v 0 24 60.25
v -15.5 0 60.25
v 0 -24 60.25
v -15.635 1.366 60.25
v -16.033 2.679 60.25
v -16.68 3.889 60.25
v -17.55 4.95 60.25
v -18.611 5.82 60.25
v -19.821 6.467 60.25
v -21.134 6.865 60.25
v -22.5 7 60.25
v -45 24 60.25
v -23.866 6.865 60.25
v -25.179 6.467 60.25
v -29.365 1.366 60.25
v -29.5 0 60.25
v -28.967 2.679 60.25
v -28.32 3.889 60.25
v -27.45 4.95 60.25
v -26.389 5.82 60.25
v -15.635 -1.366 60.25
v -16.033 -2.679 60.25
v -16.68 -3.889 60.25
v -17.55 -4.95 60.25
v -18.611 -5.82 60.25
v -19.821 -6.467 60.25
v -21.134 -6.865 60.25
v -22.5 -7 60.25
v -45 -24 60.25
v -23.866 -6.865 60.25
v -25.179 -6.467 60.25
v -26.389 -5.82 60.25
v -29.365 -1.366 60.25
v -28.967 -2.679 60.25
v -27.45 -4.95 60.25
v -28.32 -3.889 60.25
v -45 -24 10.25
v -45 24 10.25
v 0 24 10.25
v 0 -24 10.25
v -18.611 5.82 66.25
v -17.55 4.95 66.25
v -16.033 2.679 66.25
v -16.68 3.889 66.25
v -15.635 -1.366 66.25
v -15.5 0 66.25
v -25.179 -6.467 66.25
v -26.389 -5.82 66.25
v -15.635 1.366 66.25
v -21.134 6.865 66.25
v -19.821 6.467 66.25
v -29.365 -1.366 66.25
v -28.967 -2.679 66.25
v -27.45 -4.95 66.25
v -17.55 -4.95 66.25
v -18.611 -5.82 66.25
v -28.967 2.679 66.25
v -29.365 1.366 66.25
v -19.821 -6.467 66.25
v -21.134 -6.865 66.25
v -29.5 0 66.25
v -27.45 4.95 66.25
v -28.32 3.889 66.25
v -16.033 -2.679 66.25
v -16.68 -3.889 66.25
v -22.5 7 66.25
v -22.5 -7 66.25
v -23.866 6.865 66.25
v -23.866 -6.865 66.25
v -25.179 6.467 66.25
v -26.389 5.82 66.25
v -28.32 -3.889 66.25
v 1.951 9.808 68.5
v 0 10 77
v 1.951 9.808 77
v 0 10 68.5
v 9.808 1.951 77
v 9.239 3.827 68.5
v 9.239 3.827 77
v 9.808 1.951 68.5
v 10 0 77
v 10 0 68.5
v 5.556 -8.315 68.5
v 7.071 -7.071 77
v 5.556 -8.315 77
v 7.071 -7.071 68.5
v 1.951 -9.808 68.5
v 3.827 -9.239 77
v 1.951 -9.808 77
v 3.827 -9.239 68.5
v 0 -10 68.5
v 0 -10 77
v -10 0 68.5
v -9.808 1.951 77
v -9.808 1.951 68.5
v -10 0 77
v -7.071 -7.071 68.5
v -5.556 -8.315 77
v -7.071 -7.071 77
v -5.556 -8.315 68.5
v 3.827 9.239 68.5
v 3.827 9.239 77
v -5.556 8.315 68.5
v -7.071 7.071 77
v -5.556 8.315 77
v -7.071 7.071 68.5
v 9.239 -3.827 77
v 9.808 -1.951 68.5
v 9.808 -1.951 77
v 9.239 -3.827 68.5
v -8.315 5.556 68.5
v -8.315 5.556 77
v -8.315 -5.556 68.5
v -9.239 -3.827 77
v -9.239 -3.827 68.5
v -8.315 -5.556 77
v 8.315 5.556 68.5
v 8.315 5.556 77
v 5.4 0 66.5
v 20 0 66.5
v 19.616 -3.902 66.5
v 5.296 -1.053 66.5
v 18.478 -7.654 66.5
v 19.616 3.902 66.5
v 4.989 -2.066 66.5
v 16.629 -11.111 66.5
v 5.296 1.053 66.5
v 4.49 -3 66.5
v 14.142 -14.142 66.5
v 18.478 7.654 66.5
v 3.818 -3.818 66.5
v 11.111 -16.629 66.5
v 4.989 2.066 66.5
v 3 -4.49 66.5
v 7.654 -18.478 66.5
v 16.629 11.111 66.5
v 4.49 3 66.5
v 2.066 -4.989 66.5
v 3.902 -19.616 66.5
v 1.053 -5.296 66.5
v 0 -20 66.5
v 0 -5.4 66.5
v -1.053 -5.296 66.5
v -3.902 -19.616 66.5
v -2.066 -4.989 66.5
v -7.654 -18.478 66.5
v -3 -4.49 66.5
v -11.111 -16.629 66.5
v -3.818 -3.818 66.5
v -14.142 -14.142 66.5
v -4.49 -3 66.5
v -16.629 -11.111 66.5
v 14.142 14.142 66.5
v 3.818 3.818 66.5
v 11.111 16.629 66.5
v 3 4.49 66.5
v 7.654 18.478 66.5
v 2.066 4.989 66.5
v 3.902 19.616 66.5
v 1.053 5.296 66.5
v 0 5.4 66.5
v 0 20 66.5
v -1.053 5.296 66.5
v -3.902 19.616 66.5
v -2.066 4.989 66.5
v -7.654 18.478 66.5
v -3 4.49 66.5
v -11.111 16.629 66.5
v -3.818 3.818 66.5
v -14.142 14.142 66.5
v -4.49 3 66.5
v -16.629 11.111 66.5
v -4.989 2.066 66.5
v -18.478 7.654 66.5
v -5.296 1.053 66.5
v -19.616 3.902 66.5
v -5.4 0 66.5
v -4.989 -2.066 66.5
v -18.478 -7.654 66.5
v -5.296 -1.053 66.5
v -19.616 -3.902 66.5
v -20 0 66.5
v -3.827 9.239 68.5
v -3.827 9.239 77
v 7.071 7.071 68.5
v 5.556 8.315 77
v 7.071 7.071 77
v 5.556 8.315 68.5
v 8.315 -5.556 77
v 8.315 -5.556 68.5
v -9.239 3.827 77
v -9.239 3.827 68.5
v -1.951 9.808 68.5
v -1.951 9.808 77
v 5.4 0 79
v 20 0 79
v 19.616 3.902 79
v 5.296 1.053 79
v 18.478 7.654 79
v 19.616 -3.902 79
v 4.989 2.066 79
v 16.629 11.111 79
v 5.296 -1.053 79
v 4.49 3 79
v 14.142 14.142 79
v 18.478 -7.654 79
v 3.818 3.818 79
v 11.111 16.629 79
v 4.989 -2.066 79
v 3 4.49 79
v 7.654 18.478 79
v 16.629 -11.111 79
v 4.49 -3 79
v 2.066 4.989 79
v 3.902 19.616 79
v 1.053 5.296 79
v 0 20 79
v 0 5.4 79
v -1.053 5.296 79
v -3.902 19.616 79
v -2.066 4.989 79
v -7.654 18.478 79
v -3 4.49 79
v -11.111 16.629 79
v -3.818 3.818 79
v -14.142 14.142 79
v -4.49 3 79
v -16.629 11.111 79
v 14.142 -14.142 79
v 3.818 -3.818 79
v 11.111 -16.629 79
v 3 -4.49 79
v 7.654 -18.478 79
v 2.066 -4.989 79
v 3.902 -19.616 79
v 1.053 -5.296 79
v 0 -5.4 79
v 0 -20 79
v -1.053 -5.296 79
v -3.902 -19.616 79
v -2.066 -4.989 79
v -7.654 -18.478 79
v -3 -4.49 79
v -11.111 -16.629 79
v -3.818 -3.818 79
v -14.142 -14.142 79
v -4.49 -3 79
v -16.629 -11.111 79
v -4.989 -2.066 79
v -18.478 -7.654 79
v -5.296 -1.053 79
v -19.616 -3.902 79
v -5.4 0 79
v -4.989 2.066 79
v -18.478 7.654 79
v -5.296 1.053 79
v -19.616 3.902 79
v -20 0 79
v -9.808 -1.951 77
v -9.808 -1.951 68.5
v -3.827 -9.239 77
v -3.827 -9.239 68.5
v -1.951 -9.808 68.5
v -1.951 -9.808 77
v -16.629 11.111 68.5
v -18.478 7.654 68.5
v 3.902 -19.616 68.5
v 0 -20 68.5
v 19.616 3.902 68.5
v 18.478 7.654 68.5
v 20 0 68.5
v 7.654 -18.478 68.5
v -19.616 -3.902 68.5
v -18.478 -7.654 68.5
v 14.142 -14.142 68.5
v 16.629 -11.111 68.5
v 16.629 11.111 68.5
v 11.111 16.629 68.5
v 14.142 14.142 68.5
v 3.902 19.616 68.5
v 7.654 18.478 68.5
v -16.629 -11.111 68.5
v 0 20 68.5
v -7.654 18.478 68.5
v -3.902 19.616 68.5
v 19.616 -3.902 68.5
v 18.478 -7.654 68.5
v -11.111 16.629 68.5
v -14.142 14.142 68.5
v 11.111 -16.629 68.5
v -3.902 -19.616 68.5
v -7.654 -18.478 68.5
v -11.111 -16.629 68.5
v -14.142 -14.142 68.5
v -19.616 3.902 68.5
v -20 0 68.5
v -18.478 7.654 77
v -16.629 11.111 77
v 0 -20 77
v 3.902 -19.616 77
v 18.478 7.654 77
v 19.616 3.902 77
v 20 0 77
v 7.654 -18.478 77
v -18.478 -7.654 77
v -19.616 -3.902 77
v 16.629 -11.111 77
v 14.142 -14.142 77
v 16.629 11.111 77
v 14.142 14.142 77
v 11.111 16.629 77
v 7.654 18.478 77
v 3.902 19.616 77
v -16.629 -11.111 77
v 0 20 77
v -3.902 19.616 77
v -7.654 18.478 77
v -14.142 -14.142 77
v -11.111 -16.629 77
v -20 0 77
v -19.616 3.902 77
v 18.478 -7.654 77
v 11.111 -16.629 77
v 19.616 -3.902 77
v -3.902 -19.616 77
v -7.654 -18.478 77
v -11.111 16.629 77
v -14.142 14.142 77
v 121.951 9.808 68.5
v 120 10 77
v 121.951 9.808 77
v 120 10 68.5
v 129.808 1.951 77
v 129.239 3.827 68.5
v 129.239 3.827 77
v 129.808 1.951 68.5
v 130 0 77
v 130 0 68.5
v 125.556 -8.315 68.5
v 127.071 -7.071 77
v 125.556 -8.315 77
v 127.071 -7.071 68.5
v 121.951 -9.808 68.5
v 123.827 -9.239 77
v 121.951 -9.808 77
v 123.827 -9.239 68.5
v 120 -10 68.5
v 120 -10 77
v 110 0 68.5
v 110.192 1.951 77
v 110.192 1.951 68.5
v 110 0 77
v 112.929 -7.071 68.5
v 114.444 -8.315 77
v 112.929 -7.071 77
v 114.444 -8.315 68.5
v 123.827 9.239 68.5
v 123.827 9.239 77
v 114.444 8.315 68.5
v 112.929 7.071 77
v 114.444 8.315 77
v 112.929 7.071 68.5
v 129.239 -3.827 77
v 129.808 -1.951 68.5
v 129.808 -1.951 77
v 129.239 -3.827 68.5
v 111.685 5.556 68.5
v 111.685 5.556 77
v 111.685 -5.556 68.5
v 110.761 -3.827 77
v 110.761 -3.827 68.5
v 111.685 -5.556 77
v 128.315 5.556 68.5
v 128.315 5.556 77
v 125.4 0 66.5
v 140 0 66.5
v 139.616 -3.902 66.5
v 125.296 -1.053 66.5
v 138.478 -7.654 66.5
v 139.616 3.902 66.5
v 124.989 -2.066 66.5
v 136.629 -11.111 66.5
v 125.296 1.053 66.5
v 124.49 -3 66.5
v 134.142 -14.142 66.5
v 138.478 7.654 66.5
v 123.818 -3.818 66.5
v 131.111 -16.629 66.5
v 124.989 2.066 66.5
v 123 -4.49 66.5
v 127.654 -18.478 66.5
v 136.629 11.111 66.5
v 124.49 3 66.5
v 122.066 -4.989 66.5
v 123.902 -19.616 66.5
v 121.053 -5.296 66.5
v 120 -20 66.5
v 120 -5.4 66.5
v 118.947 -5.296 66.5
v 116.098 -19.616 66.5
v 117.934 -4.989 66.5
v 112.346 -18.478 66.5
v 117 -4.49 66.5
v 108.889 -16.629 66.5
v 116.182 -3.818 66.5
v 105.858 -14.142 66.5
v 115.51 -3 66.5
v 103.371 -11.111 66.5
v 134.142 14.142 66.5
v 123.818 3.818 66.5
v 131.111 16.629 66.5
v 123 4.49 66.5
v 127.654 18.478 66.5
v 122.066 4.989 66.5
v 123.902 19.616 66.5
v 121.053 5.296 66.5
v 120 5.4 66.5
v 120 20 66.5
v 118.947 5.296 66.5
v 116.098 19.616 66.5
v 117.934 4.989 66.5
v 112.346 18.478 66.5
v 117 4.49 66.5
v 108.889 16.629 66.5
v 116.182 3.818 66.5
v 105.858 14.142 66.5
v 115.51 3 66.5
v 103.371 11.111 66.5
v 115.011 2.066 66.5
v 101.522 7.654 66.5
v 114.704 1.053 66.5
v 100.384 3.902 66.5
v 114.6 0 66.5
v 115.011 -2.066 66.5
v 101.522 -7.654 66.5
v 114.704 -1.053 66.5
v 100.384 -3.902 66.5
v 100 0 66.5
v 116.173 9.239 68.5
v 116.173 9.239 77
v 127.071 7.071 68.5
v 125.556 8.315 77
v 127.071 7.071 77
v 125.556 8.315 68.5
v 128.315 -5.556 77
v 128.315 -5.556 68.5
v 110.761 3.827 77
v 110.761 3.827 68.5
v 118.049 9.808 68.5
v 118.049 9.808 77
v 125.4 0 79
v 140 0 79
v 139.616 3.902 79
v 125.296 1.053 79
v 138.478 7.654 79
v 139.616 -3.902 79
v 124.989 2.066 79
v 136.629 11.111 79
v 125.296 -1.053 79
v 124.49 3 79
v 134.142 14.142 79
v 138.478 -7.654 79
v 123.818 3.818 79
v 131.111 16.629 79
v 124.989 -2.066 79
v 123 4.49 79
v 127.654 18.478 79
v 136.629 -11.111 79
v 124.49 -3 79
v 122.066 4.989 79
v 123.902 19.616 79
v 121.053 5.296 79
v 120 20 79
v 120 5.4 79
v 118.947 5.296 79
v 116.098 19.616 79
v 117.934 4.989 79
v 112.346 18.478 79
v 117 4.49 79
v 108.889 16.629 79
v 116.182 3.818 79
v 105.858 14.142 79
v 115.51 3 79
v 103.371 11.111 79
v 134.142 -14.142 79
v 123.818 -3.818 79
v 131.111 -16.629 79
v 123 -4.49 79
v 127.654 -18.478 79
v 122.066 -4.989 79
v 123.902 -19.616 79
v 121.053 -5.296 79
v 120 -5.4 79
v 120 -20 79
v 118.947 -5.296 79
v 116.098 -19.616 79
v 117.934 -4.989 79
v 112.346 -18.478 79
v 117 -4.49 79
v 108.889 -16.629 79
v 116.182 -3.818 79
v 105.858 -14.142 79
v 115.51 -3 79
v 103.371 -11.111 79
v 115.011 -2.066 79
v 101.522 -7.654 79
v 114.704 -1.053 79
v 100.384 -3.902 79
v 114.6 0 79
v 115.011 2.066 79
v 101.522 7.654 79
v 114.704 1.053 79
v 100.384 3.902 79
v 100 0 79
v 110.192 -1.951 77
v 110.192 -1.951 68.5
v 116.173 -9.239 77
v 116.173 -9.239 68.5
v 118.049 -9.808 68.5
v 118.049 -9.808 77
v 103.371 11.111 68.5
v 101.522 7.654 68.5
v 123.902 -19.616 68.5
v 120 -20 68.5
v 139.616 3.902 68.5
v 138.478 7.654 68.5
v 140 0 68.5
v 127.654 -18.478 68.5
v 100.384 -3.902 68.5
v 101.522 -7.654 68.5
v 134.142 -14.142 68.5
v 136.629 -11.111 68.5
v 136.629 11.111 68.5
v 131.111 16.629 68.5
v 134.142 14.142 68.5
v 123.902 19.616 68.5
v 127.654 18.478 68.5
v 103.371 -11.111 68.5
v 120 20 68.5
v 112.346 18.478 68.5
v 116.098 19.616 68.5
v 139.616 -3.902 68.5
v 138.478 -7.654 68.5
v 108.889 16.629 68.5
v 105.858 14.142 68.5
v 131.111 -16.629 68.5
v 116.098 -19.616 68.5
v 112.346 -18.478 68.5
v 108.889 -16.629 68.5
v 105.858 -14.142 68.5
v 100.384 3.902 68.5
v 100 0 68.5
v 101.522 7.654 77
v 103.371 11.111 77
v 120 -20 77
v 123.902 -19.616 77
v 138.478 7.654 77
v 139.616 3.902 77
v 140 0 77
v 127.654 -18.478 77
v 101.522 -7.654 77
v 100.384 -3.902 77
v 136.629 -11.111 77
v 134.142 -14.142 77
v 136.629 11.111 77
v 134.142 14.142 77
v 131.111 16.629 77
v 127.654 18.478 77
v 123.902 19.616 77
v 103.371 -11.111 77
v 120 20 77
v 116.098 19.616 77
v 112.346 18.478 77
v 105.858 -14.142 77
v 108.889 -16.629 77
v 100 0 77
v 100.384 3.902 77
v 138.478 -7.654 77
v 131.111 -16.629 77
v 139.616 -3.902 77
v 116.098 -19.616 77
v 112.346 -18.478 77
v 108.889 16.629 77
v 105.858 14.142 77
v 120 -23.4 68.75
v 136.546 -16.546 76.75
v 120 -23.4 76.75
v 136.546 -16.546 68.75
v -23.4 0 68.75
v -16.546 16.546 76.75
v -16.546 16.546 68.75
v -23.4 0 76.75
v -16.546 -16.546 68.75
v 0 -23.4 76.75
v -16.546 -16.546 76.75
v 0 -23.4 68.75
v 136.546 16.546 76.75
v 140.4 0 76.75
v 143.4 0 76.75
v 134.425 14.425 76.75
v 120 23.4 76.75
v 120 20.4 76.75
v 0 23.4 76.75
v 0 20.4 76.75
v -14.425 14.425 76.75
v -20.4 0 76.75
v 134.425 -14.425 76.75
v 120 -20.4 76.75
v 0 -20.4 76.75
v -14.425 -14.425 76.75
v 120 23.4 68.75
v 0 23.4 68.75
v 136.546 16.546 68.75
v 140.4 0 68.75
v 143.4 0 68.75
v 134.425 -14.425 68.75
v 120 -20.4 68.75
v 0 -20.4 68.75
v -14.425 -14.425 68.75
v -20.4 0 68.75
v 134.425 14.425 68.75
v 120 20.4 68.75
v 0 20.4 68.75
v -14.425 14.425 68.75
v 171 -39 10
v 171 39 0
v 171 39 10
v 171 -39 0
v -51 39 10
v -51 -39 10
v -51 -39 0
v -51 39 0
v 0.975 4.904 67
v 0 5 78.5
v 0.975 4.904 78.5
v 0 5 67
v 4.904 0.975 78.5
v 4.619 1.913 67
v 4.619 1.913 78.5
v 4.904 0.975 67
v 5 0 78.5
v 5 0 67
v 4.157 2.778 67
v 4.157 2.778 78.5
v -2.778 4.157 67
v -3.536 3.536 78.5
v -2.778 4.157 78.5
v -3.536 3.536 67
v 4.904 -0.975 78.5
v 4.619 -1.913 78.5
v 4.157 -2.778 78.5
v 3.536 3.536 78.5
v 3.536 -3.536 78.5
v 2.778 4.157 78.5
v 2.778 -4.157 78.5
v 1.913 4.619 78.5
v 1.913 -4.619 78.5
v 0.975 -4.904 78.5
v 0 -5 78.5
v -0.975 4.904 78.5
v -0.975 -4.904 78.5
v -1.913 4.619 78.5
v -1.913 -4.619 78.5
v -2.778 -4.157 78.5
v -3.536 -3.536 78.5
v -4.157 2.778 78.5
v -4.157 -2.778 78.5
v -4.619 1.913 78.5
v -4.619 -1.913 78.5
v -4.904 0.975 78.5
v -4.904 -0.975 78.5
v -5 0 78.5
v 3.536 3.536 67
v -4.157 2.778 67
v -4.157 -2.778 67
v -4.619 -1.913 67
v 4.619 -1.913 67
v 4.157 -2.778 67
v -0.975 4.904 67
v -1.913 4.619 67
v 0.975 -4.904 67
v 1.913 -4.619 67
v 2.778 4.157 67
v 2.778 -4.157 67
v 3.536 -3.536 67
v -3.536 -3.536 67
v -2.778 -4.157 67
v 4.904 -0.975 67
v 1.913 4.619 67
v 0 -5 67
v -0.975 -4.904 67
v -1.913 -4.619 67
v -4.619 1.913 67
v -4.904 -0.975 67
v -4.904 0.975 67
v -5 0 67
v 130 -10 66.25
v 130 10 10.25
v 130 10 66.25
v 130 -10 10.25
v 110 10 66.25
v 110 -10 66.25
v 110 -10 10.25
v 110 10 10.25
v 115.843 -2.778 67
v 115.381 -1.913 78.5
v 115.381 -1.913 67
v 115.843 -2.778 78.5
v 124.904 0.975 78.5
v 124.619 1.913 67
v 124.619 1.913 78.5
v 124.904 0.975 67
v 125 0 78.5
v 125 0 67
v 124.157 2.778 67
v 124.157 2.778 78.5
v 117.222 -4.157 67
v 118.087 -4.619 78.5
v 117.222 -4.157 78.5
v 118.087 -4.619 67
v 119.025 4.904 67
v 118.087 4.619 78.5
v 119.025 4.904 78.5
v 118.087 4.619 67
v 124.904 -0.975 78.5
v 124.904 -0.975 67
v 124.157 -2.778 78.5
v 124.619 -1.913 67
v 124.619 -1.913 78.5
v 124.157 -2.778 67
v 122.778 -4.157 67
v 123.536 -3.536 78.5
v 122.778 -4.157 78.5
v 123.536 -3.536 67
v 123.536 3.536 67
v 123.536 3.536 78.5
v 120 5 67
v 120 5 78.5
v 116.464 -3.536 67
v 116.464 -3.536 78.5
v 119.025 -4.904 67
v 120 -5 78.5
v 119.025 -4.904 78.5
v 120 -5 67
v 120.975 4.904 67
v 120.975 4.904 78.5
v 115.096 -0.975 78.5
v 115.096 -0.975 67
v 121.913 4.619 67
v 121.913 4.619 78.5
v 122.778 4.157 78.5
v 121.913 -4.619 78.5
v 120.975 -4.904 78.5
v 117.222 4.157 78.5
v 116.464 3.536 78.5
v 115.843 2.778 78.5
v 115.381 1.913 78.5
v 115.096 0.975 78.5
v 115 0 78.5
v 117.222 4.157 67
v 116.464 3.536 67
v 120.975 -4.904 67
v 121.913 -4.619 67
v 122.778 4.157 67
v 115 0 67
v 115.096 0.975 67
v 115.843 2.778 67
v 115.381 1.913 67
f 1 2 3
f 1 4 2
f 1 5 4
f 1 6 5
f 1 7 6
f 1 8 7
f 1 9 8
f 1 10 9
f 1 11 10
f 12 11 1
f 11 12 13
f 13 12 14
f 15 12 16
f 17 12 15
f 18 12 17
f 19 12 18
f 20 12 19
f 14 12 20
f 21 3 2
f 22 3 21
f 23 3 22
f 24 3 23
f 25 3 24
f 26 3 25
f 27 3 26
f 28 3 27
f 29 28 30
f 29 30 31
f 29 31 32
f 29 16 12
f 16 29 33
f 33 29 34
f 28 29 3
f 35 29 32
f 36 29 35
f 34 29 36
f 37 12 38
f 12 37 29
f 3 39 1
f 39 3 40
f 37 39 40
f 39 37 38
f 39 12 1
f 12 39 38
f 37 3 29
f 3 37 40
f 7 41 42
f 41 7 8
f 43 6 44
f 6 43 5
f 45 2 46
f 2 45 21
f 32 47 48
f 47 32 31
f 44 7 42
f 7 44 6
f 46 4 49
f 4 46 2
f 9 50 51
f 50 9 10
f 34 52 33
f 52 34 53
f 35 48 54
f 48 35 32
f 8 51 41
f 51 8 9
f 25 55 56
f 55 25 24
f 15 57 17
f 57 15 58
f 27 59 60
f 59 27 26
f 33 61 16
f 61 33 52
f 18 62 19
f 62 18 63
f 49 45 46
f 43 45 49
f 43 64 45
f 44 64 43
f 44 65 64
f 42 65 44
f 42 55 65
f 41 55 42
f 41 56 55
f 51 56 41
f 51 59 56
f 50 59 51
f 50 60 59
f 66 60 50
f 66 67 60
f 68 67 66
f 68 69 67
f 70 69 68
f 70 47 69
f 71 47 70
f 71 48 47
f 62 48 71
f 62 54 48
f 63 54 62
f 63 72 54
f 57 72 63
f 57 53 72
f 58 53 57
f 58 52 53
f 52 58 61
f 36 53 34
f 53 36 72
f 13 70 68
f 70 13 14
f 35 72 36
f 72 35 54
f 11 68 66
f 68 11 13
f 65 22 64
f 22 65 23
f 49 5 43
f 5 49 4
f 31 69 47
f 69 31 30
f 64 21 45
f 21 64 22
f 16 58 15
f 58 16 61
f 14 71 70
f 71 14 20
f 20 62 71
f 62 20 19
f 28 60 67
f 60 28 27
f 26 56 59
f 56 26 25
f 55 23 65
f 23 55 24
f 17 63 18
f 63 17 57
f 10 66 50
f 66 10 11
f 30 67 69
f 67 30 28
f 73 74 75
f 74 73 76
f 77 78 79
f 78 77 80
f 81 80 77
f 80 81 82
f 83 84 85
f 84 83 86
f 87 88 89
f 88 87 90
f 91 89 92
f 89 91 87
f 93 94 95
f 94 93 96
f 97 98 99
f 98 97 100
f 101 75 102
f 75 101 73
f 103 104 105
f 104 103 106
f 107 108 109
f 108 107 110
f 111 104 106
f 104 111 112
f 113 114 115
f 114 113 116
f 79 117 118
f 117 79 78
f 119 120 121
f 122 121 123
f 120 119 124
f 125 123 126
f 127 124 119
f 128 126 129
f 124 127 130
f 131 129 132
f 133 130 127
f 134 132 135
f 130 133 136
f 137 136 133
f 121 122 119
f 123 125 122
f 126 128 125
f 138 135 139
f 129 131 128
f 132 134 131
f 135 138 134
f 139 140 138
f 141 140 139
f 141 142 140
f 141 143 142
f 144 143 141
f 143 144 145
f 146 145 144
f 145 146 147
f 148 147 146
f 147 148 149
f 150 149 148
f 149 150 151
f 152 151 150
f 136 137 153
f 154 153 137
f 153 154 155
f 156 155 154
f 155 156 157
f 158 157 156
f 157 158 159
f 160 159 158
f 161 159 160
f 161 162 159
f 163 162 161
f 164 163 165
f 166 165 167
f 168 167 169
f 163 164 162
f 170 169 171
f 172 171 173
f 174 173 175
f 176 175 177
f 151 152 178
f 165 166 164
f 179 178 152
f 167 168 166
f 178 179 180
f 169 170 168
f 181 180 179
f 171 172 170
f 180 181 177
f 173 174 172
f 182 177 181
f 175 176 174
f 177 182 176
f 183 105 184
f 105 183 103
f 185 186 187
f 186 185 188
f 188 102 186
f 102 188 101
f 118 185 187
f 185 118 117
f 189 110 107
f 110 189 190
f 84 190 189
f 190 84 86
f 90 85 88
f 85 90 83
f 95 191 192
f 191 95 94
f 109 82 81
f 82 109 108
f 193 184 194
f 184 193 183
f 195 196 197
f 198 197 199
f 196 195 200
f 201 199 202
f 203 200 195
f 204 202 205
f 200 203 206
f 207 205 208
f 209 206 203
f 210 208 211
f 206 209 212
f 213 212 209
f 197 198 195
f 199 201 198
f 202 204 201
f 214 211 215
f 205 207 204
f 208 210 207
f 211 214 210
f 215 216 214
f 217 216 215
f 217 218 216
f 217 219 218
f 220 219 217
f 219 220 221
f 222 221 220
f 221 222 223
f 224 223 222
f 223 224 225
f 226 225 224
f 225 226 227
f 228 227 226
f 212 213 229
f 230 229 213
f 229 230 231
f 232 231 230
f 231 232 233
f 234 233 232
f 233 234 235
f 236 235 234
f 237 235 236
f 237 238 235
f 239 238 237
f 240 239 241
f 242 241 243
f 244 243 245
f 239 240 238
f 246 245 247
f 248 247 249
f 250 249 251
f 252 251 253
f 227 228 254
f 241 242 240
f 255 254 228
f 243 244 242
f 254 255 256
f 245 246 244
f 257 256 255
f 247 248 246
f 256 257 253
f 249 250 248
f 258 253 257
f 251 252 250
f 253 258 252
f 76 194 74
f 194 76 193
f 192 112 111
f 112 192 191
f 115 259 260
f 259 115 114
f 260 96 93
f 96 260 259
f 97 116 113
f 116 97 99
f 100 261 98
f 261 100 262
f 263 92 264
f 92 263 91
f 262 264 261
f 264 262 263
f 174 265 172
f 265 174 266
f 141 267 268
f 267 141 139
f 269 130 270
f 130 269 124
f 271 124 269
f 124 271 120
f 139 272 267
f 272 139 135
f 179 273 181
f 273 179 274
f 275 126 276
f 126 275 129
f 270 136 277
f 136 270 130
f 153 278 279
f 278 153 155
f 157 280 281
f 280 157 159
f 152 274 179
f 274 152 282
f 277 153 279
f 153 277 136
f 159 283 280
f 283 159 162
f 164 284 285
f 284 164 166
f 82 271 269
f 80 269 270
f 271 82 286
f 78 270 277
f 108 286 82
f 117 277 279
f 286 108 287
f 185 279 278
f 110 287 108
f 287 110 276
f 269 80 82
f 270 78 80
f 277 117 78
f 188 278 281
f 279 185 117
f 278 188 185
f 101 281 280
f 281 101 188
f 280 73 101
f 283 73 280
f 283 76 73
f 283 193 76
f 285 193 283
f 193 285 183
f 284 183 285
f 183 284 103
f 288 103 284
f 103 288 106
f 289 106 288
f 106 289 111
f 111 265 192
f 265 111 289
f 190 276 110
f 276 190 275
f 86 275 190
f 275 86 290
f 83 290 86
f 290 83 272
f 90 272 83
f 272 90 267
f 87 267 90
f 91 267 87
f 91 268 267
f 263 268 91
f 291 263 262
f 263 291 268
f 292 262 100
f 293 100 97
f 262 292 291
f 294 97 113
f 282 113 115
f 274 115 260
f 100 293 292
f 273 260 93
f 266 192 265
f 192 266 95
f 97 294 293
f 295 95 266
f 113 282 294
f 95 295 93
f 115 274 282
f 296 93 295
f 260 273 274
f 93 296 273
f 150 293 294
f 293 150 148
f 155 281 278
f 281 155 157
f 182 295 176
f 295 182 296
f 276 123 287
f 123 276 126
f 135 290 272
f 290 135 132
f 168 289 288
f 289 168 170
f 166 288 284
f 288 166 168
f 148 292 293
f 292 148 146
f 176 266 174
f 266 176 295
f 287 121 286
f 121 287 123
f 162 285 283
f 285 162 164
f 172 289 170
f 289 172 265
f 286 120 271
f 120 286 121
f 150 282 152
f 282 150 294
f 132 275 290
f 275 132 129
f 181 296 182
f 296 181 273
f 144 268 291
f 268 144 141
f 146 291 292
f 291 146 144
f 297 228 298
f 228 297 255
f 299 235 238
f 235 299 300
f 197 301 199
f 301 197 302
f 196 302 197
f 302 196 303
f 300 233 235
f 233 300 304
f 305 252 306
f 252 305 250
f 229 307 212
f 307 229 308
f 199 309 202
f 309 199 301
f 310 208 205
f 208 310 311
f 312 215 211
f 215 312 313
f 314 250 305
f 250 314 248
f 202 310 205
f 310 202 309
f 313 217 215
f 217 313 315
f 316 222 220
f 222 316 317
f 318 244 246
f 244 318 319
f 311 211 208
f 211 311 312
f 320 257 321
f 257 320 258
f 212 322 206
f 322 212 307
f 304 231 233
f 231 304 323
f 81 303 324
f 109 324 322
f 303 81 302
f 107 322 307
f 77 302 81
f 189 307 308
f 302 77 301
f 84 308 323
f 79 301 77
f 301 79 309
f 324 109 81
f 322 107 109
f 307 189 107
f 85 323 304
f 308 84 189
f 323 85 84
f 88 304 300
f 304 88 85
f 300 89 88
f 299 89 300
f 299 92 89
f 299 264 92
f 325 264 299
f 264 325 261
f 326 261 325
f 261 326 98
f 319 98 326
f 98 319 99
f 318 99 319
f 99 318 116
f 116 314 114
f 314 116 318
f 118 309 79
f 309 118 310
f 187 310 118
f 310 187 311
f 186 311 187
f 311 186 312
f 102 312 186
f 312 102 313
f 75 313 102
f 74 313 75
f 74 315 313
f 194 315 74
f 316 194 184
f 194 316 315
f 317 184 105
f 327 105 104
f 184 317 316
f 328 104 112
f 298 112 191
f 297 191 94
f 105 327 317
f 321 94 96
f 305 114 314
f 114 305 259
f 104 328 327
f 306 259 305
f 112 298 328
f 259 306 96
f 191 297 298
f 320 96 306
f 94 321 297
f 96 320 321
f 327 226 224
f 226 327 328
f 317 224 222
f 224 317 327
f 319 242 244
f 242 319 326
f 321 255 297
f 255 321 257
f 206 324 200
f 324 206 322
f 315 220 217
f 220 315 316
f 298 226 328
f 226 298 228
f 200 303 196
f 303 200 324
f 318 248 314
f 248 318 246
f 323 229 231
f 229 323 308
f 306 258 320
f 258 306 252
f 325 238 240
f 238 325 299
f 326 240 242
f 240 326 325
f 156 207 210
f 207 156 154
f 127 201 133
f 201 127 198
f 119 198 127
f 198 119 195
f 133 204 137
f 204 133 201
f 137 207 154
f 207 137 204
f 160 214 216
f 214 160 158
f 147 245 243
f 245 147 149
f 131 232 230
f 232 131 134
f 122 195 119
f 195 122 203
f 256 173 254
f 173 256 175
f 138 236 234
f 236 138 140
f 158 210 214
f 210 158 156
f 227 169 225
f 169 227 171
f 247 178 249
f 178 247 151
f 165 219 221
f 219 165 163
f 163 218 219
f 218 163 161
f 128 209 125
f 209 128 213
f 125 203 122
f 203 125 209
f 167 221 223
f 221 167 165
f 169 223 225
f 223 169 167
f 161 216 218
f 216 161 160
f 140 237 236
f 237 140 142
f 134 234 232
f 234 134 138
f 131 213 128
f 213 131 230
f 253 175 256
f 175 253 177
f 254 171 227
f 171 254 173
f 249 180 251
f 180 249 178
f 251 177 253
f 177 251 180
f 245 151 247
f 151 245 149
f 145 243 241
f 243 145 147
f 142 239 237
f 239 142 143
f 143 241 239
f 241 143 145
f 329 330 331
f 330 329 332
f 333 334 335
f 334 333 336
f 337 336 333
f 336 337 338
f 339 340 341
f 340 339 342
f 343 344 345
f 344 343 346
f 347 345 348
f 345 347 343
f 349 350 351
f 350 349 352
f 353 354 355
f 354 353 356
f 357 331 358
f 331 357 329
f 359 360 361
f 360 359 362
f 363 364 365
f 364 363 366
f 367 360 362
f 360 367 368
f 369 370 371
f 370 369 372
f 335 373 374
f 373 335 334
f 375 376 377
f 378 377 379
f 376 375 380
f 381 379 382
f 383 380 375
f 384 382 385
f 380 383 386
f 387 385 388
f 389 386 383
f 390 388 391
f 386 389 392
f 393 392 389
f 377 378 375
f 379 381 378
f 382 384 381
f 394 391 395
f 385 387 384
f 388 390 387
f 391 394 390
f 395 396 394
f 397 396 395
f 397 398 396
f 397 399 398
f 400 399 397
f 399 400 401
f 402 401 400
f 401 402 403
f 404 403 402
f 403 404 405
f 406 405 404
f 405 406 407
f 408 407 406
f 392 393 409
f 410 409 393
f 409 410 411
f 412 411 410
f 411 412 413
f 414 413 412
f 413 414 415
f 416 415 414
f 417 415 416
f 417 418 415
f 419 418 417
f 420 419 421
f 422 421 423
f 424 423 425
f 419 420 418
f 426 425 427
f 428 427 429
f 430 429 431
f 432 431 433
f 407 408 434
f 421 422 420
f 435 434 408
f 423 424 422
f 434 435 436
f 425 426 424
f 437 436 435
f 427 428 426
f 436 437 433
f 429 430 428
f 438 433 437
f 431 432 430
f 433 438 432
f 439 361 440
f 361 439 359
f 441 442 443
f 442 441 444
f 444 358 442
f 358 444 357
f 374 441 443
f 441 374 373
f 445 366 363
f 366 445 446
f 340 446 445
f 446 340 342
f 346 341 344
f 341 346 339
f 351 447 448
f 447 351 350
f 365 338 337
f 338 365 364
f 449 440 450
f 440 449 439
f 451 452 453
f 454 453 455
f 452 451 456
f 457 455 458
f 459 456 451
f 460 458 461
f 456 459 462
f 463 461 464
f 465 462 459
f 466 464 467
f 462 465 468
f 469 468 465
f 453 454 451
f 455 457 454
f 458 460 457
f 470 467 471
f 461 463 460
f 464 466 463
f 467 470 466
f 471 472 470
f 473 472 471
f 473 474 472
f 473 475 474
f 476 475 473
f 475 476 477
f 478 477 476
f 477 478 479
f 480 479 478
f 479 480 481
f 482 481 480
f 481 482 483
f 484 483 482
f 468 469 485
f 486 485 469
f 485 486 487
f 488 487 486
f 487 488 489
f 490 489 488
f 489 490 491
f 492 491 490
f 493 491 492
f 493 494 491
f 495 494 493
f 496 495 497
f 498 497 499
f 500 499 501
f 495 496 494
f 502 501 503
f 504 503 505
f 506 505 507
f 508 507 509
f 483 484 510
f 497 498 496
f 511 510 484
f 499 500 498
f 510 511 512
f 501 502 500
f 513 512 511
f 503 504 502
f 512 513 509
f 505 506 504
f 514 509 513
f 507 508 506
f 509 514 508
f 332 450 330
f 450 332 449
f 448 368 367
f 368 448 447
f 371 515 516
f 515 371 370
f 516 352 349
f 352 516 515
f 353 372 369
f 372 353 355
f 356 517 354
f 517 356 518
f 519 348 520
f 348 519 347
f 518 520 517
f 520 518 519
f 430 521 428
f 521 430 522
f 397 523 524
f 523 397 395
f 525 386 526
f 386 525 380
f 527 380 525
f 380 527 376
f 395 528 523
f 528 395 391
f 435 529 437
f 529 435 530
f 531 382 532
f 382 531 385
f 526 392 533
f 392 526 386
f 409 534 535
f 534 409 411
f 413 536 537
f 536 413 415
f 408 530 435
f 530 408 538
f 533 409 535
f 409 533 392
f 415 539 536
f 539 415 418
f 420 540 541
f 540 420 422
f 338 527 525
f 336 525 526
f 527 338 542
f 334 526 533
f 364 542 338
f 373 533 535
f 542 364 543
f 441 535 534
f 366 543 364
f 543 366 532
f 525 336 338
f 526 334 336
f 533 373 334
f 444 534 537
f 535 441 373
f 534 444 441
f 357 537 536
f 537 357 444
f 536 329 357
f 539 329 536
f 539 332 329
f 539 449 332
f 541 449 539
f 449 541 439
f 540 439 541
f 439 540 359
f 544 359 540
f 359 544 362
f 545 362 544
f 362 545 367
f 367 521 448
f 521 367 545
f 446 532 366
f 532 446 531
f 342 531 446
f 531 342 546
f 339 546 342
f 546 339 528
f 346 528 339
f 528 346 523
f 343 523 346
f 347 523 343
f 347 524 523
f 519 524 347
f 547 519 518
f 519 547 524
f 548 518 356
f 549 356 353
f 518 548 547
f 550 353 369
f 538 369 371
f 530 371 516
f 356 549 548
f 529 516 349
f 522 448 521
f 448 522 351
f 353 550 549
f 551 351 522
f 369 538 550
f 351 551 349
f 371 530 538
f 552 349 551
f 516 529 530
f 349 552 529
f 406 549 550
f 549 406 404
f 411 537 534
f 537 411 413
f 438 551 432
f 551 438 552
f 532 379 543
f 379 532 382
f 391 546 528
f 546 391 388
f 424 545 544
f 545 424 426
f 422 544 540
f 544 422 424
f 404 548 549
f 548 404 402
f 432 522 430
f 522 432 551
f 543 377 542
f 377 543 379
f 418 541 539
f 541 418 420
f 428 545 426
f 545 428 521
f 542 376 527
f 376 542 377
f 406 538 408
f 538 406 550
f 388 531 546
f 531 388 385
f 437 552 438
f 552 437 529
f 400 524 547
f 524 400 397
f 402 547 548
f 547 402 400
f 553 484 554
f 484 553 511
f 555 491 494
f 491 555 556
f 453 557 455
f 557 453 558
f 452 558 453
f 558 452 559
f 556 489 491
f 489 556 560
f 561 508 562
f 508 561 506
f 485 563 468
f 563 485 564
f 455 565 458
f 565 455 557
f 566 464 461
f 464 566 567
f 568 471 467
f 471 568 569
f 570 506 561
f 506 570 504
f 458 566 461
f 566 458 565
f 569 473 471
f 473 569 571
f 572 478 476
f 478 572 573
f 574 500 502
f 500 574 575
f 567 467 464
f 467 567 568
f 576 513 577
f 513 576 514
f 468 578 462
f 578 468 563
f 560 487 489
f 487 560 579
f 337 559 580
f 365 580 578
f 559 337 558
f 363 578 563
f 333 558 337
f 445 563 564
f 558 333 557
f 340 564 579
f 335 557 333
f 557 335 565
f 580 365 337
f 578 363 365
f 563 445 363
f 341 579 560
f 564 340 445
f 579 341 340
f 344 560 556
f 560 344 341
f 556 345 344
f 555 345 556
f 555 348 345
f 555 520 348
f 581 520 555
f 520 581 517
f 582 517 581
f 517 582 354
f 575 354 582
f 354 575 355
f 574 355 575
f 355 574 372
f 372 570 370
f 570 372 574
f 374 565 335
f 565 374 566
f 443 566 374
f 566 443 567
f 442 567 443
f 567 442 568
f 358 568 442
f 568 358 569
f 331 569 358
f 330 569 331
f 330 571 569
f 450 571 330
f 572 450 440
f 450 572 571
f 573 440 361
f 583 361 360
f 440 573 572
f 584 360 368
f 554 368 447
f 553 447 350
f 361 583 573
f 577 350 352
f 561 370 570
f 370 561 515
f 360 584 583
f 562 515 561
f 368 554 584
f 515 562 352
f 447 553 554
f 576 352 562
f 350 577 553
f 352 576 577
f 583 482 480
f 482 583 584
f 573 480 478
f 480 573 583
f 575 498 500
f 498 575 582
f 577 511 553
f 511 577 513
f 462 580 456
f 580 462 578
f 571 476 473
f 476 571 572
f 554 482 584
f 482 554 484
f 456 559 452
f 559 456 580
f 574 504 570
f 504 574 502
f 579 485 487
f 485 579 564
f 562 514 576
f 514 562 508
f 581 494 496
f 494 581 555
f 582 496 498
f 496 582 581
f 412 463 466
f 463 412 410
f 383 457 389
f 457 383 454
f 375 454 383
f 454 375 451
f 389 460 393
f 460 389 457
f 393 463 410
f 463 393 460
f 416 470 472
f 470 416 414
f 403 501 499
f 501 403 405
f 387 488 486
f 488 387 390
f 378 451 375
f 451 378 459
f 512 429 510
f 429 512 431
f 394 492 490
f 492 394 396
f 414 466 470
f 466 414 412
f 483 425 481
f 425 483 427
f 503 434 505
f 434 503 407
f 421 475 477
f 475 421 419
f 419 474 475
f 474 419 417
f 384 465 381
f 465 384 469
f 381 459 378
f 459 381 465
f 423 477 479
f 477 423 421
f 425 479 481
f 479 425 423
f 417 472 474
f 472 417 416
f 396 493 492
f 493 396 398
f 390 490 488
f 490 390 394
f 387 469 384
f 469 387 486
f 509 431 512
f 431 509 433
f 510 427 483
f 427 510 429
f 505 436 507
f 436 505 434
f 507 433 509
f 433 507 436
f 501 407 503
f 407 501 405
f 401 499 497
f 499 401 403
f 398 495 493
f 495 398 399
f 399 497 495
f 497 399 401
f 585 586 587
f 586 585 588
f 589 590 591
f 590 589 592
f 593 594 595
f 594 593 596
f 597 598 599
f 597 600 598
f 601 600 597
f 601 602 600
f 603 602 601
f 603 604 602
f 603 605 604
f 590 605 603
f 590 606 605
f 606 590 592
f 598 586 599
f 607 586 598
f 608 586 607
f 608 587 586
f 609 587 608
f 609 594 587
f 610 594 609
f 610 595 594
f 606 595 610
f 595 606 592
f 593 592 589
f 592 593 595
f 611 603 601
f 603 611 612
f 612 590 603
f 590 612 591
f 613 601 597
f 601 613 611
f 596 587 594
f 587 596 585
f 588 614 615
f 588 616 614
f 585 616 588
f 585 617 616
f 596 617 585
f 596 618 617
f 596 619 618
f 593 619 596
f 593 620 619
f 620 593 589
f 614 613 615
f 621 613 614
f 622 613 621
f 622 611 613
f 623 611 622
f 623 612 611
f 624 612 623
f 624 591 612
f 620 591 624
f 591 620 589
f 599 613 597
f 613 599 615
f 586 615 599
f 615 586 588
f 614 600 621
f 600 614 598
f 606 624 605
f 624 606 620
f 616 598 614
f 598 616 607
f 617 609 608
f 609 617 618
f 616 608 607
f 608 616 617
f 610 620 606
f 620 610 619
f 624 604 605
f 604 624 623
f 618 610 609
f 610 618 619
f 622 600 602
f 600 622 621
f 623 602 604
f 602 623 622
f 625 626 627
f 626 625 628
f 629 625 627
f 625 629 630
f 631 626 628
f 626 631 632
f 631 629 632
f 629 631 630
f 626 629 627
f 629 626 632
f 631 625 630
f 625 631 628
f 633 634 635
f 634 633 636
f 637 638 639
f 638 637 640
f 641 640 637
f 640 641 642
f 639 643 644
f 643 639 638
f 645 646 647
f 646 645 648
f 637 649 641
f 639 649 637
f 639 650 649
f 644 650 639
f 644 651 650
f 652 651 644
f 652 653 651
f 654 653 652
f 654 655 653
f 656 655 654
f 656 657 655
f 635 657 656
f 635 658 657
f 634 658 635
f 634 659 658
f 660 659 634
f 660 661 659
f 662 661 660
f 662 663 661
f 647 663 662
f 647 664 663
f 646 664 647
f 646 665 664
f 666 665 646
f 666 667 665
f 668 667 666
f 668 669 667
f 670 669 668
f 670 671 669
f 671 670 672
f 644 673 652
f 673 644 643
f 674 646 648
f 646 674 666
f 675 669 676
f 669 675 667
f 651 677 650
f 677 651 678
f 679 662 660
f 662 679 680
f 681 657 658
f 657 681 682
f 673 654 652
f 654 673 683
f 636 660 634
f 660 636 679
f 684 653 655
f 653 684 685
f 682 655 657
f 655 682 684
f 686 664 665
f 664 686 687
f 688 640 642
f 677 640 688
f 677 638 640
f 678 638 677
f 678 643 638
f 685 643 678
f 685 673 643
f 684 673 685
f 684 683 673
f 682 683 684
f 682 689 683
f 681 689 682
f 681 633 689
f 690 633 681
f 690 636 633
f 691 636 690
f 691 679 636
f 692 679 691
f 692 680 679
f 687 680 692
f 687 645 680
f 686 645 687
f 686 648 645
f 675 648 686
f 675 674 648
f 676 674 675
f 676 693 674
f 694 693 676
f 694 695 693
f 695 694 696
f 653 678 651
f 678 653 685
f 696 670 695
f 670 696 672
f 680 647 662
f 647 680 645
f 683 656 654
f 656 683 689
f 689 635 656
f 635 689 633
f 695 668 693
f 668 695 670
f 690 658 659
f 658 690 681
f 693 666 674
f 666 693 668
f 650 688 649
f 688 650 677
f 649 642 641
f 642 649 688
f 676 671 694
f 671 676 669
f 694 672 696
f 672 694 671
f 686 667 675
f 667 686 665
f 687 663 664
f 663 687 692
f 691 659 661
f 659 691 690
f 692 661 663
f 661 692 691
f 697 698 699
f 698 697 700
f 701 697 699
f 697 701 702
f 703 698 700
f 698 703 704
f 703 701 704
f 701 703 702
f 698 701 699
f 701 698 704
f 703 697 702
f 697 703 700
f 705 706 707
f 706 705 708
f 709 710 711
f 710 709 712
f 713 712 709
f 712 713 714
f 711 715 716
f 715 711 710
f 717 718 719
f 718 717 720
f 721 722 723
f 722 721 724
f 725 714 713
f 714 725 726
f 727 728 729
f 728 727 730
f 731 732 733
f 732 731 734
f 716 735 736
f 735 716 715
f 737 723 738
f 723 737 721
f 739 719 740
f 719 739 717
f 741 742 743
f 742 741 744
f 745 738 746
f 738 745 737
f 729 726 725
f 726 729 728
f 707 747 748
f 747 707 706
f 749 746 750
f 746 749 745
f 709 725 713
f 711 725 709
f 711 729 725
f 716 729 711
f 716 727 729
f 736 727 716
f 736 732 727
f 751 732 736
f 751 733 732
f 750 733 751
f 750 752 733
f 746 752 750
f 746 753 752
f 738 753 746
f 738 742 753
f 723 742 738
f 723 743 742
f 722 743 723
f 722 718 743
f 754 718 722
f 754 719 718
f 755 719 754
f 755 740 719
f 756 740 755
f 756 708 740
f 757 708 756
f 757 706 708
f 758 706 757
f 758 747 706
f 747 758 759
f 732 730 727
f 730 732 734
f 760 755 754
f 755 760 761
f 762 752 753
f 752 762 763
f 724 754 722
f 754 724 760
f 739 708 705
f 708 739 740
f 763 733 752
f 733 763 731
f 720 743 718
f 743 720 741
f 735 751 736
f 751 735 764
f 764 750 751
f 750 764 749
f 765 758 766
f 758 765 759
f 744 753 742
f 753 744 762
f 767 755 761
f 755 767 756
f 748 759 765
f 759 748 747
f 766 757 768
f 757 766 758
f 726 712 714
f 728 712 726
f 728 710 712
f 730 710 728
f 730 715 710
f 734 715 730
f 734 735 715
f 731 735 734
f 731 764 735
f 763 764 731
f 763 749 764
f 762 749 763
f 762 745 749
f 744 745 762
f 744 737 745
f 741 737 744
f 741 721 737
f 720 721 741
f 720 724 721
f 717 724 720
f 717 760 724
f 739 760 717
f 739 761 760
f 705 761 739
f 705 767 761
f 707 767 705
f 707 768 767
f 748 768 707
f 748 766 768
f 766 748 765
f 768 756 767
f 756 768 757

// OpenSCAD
$fn = 32;

// ------------------------------------------------------------------------
// Motor belt drive: span 120 mm, pulleys d40, belt 8 mm wide
// Every part is its own module, assembly() places every instance.
// ------------------------------------------------------------------------

// --- part 1 ---
module base_plate() {
  difference() {
    translate([-111, -39, 0]) cube([222, 78, 10]);
  }
}

// --- part 2 ---
module motor() {
  union() {
    translate([-25, -24, 0]) cube([50, 48, 45]);
    translate([28, 0, 22.5]) rotate([0, 90, 0]) cylinder(h = 6, d = 14, center = true);
  }
}

// --- part 3 ---
module drive_shaft() {
  translate([0, 0, -5.75]) cylinder(h = 11.5, d = 10);
}

// --- part 4 ---
module pulley_drive() {
  difference() {
    union() {
      cylinder(h = 12.5, d = 20);
      cylinder(h = 2, d = 40);
      translate([0, 0, 10.5]) cylinder(h = 2, d = 40);
    }
    translate([0, 0, -1]) cylinder(h = 14.5, d = 10.8);
  }
}

// --- part 5 ---
module idler_post() {
  translate([-10, -10, 0]) cube([20, 20, 56]);
}

// --- part 6 ---
module driven_shaft() {
  translate([0, 0, -5.75]) cylinder(h = 11.5, d = 10);
}

// --- part 7 ---
module pulley_driven() {
  difference() {
    union() {
      cylinder(h = 12.5, d = 20);
      cylinder(h = 2, d = 40);
      translate([0, 0, 10.5]) cylinder(h = 2, d = 40);
    }
    translate([0, 0, -1]) cylinder(h = 14.5, d = 10.8);
  }
}

// --- part 8 ---
module drive_belt() {
  difference() {
    linear_extrude(height = 8) polygon(points = concat([for (a = [90 : 45 : 270]) [23.4 * cos(a), 23.4 * sin(a)]], [for (a = [270 : 45 : 450]) [120 + 23.4 * cos(a), 23.4 * sin(a)]]));
    translate([0, 0, -1]) linear_extrude(height = 10) polygon(points = concat([for (a = [90 : 45 : 270]) [20.4 * cos(a), 20.4 * sin(a)]], [for (a = [270 : 45 : 450]) [120 + 20.4 * cos(a), 20.4 * sin(a)]]));
  }
}

// --- assembly ---
module assembly() {
  color([0.80, 0.24, 0.20]) translate([60, 0, 0]) rotate([0, 0, 0]) base_plate();
  color([0.20, 0.45, 0.75]) translate([0, 0, 35.25]) rotate([0, 270, 0]) motor();
  color([0.25, 0.62, 0.32]) translate([0, 0, 72.75]) rotate([0, 0, 0]) drive_shaft();
  color([0.92, 0.70, 0.18]) translate([0, 0, 66.5]) rotate([0, 0, 0]) pulley_drive();
  color([0.58, 0.35, 0.70]) translate([120, 0, 10.25]) rotate([0, 0, 0]) idler_post();
  color([0.16, 0.66, 0.66]) translate([120, 0, 72.75]) rotate([0, 0, 0]) driven_shaft();
  color([0.85, 0.48, 0.18]) translate([120, 0, 66.5]) rotate([0, 0, 0]) pulley_driven();
  color([0.55, 0.60, 0.65]) translate([0, 0, 68.75]) rotate([0, 0, 0]) drive_belt();
}

assembly();
